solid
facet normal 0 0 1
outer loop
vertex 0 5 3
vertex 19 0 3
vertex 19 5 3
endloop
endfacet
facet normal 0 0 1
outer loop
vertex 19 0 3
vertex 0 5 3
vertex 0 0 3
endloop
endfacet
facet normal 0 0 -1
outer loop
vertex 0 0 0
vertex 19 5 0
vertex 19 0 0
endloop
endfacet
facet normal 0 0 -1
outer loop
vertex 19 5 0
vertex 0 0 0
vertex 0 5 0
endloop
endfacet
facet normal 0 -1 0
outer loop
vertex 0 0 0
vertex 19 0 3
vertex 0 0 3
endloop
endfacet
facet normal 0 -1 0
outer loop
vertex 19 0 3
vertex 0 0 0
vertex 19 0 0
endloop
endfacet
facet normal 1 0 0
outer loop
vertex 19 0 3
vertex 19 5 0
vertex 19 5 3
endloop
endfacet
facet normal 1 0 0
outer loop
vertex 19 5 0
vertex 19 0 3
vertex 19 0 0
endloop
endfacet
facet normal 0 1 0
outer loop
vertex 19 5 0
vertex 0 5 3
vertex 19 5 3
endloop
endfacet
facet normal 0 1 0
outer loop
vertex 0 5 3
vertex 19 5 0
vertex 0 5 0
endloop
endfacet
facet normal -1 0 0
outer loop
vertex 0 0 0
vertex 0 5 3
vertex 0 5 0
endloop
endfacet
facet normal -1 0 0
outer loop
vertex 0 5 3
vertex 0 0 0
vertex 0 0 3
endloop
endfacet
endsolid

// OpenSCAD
// Generated by SolidPython 1.0.1 on 2020-07-29 00:46:56


cube(size = [19, 5, 3]);
/***********************************************
*********      SolidPython code:      **********
************************************************
 
# import packages: SolidPython
from solid import *
from solid.utils import *
from itertools import chain, combinations, permutations


class Resize:

    def __init__(self, scad_file):
        self.scad_file = scad_file
        #self.scad_file = import_scad(scad_file)
        # cone/cylinder param:
        self.r1 = 0
        self.r2 = 0
        self.h = 0
        # rectangular prism param:
        self.w = 0
        self.l = 0
        # ellipse param:
        self.r = 0

    # import OpenScad code (file name corresponds to shape)


    # classify shape + parameters
    def assign(self, param1, param2, param3):
        if self.scad_file == 'cone.scad':
            self.r1 = param1
            self.r2 = param2
            self.h = param3
        elif self.scad_file == 'cylinder.scad':
            self.r1 = param1
            self.r2 = param2
            self.h = param3
        elif self.scad_file == 'rectangularPrism.scad':
            self.h = param1
            self.l = param2
            self.w = param3
        else:
            self.r = param1
            self.h = param2

    # resize parameters
    def iterate(self):
        x = range(3, 20, 2)
        i = 1
        if self.scad_file == 'cone.scad':
            tempList = list(permutations(x, 2))
            for temp in tempList:
                param1 = temp[0]
                param2 = temp[1]
                filepath = 'produced_scad_files/' + 'cone' + str(param1) + '_' + str(param2) + '_' + '.scad'
                scad_render_to_file(cylinder(h=param1, r1=param2, r2=0), filepath)

        elif self.scad_file == 'cylinder.scad':
            tempList = list(permutations(x, 3))
            for temp in tempList:
                param1 = temp[0]
                param2 = temp[1]
                filepath = 'produced_scad_files/' + 'cylinder' + str(param1) + '_' + str(param2) + '_' + '.scad'
                scad_render_to_file(cylinder(h=param1, r1=param2, r2=param2), filepath)

        elif self.scad_file == 'rectangularPrism.scad':
            tempList = list(permutations(x, 3))
            for temp in tempList:
                param1 = temp[0]
                param2 = temp[1]
                param3 = temp[2]
                filepath = 'produced_scad_files/' + 'rectangularPrism' + str(param1) + '_' + str(param2) + '_' + str(
                    param3) + '.scad'
                scad_render_to_file(cube(size=(param1, param2, param3)), filepath)

        elif self.scad_file == 'ellipse.scad':
            tempList = list(permutations(x, 4))
            for temp in tempList:
                param1 = temp[0]
                param2 = temp[1]
                param3 = temp[2]
                param4 = temp[3]
                filepath = 'produced_scad_files/' + 'ellipse' + str(param1) + '_' + str(param2) + '_' + str(param3) + '_' + str(param4) + '.scad'
                scad_render_to_file(scale([param1, param2, param3])(sphere(r=param4)), filepath)

    def render_to_scadfile(self):
        scad_render_to_file(scad, 'example.scad') 
 
************************************************/
